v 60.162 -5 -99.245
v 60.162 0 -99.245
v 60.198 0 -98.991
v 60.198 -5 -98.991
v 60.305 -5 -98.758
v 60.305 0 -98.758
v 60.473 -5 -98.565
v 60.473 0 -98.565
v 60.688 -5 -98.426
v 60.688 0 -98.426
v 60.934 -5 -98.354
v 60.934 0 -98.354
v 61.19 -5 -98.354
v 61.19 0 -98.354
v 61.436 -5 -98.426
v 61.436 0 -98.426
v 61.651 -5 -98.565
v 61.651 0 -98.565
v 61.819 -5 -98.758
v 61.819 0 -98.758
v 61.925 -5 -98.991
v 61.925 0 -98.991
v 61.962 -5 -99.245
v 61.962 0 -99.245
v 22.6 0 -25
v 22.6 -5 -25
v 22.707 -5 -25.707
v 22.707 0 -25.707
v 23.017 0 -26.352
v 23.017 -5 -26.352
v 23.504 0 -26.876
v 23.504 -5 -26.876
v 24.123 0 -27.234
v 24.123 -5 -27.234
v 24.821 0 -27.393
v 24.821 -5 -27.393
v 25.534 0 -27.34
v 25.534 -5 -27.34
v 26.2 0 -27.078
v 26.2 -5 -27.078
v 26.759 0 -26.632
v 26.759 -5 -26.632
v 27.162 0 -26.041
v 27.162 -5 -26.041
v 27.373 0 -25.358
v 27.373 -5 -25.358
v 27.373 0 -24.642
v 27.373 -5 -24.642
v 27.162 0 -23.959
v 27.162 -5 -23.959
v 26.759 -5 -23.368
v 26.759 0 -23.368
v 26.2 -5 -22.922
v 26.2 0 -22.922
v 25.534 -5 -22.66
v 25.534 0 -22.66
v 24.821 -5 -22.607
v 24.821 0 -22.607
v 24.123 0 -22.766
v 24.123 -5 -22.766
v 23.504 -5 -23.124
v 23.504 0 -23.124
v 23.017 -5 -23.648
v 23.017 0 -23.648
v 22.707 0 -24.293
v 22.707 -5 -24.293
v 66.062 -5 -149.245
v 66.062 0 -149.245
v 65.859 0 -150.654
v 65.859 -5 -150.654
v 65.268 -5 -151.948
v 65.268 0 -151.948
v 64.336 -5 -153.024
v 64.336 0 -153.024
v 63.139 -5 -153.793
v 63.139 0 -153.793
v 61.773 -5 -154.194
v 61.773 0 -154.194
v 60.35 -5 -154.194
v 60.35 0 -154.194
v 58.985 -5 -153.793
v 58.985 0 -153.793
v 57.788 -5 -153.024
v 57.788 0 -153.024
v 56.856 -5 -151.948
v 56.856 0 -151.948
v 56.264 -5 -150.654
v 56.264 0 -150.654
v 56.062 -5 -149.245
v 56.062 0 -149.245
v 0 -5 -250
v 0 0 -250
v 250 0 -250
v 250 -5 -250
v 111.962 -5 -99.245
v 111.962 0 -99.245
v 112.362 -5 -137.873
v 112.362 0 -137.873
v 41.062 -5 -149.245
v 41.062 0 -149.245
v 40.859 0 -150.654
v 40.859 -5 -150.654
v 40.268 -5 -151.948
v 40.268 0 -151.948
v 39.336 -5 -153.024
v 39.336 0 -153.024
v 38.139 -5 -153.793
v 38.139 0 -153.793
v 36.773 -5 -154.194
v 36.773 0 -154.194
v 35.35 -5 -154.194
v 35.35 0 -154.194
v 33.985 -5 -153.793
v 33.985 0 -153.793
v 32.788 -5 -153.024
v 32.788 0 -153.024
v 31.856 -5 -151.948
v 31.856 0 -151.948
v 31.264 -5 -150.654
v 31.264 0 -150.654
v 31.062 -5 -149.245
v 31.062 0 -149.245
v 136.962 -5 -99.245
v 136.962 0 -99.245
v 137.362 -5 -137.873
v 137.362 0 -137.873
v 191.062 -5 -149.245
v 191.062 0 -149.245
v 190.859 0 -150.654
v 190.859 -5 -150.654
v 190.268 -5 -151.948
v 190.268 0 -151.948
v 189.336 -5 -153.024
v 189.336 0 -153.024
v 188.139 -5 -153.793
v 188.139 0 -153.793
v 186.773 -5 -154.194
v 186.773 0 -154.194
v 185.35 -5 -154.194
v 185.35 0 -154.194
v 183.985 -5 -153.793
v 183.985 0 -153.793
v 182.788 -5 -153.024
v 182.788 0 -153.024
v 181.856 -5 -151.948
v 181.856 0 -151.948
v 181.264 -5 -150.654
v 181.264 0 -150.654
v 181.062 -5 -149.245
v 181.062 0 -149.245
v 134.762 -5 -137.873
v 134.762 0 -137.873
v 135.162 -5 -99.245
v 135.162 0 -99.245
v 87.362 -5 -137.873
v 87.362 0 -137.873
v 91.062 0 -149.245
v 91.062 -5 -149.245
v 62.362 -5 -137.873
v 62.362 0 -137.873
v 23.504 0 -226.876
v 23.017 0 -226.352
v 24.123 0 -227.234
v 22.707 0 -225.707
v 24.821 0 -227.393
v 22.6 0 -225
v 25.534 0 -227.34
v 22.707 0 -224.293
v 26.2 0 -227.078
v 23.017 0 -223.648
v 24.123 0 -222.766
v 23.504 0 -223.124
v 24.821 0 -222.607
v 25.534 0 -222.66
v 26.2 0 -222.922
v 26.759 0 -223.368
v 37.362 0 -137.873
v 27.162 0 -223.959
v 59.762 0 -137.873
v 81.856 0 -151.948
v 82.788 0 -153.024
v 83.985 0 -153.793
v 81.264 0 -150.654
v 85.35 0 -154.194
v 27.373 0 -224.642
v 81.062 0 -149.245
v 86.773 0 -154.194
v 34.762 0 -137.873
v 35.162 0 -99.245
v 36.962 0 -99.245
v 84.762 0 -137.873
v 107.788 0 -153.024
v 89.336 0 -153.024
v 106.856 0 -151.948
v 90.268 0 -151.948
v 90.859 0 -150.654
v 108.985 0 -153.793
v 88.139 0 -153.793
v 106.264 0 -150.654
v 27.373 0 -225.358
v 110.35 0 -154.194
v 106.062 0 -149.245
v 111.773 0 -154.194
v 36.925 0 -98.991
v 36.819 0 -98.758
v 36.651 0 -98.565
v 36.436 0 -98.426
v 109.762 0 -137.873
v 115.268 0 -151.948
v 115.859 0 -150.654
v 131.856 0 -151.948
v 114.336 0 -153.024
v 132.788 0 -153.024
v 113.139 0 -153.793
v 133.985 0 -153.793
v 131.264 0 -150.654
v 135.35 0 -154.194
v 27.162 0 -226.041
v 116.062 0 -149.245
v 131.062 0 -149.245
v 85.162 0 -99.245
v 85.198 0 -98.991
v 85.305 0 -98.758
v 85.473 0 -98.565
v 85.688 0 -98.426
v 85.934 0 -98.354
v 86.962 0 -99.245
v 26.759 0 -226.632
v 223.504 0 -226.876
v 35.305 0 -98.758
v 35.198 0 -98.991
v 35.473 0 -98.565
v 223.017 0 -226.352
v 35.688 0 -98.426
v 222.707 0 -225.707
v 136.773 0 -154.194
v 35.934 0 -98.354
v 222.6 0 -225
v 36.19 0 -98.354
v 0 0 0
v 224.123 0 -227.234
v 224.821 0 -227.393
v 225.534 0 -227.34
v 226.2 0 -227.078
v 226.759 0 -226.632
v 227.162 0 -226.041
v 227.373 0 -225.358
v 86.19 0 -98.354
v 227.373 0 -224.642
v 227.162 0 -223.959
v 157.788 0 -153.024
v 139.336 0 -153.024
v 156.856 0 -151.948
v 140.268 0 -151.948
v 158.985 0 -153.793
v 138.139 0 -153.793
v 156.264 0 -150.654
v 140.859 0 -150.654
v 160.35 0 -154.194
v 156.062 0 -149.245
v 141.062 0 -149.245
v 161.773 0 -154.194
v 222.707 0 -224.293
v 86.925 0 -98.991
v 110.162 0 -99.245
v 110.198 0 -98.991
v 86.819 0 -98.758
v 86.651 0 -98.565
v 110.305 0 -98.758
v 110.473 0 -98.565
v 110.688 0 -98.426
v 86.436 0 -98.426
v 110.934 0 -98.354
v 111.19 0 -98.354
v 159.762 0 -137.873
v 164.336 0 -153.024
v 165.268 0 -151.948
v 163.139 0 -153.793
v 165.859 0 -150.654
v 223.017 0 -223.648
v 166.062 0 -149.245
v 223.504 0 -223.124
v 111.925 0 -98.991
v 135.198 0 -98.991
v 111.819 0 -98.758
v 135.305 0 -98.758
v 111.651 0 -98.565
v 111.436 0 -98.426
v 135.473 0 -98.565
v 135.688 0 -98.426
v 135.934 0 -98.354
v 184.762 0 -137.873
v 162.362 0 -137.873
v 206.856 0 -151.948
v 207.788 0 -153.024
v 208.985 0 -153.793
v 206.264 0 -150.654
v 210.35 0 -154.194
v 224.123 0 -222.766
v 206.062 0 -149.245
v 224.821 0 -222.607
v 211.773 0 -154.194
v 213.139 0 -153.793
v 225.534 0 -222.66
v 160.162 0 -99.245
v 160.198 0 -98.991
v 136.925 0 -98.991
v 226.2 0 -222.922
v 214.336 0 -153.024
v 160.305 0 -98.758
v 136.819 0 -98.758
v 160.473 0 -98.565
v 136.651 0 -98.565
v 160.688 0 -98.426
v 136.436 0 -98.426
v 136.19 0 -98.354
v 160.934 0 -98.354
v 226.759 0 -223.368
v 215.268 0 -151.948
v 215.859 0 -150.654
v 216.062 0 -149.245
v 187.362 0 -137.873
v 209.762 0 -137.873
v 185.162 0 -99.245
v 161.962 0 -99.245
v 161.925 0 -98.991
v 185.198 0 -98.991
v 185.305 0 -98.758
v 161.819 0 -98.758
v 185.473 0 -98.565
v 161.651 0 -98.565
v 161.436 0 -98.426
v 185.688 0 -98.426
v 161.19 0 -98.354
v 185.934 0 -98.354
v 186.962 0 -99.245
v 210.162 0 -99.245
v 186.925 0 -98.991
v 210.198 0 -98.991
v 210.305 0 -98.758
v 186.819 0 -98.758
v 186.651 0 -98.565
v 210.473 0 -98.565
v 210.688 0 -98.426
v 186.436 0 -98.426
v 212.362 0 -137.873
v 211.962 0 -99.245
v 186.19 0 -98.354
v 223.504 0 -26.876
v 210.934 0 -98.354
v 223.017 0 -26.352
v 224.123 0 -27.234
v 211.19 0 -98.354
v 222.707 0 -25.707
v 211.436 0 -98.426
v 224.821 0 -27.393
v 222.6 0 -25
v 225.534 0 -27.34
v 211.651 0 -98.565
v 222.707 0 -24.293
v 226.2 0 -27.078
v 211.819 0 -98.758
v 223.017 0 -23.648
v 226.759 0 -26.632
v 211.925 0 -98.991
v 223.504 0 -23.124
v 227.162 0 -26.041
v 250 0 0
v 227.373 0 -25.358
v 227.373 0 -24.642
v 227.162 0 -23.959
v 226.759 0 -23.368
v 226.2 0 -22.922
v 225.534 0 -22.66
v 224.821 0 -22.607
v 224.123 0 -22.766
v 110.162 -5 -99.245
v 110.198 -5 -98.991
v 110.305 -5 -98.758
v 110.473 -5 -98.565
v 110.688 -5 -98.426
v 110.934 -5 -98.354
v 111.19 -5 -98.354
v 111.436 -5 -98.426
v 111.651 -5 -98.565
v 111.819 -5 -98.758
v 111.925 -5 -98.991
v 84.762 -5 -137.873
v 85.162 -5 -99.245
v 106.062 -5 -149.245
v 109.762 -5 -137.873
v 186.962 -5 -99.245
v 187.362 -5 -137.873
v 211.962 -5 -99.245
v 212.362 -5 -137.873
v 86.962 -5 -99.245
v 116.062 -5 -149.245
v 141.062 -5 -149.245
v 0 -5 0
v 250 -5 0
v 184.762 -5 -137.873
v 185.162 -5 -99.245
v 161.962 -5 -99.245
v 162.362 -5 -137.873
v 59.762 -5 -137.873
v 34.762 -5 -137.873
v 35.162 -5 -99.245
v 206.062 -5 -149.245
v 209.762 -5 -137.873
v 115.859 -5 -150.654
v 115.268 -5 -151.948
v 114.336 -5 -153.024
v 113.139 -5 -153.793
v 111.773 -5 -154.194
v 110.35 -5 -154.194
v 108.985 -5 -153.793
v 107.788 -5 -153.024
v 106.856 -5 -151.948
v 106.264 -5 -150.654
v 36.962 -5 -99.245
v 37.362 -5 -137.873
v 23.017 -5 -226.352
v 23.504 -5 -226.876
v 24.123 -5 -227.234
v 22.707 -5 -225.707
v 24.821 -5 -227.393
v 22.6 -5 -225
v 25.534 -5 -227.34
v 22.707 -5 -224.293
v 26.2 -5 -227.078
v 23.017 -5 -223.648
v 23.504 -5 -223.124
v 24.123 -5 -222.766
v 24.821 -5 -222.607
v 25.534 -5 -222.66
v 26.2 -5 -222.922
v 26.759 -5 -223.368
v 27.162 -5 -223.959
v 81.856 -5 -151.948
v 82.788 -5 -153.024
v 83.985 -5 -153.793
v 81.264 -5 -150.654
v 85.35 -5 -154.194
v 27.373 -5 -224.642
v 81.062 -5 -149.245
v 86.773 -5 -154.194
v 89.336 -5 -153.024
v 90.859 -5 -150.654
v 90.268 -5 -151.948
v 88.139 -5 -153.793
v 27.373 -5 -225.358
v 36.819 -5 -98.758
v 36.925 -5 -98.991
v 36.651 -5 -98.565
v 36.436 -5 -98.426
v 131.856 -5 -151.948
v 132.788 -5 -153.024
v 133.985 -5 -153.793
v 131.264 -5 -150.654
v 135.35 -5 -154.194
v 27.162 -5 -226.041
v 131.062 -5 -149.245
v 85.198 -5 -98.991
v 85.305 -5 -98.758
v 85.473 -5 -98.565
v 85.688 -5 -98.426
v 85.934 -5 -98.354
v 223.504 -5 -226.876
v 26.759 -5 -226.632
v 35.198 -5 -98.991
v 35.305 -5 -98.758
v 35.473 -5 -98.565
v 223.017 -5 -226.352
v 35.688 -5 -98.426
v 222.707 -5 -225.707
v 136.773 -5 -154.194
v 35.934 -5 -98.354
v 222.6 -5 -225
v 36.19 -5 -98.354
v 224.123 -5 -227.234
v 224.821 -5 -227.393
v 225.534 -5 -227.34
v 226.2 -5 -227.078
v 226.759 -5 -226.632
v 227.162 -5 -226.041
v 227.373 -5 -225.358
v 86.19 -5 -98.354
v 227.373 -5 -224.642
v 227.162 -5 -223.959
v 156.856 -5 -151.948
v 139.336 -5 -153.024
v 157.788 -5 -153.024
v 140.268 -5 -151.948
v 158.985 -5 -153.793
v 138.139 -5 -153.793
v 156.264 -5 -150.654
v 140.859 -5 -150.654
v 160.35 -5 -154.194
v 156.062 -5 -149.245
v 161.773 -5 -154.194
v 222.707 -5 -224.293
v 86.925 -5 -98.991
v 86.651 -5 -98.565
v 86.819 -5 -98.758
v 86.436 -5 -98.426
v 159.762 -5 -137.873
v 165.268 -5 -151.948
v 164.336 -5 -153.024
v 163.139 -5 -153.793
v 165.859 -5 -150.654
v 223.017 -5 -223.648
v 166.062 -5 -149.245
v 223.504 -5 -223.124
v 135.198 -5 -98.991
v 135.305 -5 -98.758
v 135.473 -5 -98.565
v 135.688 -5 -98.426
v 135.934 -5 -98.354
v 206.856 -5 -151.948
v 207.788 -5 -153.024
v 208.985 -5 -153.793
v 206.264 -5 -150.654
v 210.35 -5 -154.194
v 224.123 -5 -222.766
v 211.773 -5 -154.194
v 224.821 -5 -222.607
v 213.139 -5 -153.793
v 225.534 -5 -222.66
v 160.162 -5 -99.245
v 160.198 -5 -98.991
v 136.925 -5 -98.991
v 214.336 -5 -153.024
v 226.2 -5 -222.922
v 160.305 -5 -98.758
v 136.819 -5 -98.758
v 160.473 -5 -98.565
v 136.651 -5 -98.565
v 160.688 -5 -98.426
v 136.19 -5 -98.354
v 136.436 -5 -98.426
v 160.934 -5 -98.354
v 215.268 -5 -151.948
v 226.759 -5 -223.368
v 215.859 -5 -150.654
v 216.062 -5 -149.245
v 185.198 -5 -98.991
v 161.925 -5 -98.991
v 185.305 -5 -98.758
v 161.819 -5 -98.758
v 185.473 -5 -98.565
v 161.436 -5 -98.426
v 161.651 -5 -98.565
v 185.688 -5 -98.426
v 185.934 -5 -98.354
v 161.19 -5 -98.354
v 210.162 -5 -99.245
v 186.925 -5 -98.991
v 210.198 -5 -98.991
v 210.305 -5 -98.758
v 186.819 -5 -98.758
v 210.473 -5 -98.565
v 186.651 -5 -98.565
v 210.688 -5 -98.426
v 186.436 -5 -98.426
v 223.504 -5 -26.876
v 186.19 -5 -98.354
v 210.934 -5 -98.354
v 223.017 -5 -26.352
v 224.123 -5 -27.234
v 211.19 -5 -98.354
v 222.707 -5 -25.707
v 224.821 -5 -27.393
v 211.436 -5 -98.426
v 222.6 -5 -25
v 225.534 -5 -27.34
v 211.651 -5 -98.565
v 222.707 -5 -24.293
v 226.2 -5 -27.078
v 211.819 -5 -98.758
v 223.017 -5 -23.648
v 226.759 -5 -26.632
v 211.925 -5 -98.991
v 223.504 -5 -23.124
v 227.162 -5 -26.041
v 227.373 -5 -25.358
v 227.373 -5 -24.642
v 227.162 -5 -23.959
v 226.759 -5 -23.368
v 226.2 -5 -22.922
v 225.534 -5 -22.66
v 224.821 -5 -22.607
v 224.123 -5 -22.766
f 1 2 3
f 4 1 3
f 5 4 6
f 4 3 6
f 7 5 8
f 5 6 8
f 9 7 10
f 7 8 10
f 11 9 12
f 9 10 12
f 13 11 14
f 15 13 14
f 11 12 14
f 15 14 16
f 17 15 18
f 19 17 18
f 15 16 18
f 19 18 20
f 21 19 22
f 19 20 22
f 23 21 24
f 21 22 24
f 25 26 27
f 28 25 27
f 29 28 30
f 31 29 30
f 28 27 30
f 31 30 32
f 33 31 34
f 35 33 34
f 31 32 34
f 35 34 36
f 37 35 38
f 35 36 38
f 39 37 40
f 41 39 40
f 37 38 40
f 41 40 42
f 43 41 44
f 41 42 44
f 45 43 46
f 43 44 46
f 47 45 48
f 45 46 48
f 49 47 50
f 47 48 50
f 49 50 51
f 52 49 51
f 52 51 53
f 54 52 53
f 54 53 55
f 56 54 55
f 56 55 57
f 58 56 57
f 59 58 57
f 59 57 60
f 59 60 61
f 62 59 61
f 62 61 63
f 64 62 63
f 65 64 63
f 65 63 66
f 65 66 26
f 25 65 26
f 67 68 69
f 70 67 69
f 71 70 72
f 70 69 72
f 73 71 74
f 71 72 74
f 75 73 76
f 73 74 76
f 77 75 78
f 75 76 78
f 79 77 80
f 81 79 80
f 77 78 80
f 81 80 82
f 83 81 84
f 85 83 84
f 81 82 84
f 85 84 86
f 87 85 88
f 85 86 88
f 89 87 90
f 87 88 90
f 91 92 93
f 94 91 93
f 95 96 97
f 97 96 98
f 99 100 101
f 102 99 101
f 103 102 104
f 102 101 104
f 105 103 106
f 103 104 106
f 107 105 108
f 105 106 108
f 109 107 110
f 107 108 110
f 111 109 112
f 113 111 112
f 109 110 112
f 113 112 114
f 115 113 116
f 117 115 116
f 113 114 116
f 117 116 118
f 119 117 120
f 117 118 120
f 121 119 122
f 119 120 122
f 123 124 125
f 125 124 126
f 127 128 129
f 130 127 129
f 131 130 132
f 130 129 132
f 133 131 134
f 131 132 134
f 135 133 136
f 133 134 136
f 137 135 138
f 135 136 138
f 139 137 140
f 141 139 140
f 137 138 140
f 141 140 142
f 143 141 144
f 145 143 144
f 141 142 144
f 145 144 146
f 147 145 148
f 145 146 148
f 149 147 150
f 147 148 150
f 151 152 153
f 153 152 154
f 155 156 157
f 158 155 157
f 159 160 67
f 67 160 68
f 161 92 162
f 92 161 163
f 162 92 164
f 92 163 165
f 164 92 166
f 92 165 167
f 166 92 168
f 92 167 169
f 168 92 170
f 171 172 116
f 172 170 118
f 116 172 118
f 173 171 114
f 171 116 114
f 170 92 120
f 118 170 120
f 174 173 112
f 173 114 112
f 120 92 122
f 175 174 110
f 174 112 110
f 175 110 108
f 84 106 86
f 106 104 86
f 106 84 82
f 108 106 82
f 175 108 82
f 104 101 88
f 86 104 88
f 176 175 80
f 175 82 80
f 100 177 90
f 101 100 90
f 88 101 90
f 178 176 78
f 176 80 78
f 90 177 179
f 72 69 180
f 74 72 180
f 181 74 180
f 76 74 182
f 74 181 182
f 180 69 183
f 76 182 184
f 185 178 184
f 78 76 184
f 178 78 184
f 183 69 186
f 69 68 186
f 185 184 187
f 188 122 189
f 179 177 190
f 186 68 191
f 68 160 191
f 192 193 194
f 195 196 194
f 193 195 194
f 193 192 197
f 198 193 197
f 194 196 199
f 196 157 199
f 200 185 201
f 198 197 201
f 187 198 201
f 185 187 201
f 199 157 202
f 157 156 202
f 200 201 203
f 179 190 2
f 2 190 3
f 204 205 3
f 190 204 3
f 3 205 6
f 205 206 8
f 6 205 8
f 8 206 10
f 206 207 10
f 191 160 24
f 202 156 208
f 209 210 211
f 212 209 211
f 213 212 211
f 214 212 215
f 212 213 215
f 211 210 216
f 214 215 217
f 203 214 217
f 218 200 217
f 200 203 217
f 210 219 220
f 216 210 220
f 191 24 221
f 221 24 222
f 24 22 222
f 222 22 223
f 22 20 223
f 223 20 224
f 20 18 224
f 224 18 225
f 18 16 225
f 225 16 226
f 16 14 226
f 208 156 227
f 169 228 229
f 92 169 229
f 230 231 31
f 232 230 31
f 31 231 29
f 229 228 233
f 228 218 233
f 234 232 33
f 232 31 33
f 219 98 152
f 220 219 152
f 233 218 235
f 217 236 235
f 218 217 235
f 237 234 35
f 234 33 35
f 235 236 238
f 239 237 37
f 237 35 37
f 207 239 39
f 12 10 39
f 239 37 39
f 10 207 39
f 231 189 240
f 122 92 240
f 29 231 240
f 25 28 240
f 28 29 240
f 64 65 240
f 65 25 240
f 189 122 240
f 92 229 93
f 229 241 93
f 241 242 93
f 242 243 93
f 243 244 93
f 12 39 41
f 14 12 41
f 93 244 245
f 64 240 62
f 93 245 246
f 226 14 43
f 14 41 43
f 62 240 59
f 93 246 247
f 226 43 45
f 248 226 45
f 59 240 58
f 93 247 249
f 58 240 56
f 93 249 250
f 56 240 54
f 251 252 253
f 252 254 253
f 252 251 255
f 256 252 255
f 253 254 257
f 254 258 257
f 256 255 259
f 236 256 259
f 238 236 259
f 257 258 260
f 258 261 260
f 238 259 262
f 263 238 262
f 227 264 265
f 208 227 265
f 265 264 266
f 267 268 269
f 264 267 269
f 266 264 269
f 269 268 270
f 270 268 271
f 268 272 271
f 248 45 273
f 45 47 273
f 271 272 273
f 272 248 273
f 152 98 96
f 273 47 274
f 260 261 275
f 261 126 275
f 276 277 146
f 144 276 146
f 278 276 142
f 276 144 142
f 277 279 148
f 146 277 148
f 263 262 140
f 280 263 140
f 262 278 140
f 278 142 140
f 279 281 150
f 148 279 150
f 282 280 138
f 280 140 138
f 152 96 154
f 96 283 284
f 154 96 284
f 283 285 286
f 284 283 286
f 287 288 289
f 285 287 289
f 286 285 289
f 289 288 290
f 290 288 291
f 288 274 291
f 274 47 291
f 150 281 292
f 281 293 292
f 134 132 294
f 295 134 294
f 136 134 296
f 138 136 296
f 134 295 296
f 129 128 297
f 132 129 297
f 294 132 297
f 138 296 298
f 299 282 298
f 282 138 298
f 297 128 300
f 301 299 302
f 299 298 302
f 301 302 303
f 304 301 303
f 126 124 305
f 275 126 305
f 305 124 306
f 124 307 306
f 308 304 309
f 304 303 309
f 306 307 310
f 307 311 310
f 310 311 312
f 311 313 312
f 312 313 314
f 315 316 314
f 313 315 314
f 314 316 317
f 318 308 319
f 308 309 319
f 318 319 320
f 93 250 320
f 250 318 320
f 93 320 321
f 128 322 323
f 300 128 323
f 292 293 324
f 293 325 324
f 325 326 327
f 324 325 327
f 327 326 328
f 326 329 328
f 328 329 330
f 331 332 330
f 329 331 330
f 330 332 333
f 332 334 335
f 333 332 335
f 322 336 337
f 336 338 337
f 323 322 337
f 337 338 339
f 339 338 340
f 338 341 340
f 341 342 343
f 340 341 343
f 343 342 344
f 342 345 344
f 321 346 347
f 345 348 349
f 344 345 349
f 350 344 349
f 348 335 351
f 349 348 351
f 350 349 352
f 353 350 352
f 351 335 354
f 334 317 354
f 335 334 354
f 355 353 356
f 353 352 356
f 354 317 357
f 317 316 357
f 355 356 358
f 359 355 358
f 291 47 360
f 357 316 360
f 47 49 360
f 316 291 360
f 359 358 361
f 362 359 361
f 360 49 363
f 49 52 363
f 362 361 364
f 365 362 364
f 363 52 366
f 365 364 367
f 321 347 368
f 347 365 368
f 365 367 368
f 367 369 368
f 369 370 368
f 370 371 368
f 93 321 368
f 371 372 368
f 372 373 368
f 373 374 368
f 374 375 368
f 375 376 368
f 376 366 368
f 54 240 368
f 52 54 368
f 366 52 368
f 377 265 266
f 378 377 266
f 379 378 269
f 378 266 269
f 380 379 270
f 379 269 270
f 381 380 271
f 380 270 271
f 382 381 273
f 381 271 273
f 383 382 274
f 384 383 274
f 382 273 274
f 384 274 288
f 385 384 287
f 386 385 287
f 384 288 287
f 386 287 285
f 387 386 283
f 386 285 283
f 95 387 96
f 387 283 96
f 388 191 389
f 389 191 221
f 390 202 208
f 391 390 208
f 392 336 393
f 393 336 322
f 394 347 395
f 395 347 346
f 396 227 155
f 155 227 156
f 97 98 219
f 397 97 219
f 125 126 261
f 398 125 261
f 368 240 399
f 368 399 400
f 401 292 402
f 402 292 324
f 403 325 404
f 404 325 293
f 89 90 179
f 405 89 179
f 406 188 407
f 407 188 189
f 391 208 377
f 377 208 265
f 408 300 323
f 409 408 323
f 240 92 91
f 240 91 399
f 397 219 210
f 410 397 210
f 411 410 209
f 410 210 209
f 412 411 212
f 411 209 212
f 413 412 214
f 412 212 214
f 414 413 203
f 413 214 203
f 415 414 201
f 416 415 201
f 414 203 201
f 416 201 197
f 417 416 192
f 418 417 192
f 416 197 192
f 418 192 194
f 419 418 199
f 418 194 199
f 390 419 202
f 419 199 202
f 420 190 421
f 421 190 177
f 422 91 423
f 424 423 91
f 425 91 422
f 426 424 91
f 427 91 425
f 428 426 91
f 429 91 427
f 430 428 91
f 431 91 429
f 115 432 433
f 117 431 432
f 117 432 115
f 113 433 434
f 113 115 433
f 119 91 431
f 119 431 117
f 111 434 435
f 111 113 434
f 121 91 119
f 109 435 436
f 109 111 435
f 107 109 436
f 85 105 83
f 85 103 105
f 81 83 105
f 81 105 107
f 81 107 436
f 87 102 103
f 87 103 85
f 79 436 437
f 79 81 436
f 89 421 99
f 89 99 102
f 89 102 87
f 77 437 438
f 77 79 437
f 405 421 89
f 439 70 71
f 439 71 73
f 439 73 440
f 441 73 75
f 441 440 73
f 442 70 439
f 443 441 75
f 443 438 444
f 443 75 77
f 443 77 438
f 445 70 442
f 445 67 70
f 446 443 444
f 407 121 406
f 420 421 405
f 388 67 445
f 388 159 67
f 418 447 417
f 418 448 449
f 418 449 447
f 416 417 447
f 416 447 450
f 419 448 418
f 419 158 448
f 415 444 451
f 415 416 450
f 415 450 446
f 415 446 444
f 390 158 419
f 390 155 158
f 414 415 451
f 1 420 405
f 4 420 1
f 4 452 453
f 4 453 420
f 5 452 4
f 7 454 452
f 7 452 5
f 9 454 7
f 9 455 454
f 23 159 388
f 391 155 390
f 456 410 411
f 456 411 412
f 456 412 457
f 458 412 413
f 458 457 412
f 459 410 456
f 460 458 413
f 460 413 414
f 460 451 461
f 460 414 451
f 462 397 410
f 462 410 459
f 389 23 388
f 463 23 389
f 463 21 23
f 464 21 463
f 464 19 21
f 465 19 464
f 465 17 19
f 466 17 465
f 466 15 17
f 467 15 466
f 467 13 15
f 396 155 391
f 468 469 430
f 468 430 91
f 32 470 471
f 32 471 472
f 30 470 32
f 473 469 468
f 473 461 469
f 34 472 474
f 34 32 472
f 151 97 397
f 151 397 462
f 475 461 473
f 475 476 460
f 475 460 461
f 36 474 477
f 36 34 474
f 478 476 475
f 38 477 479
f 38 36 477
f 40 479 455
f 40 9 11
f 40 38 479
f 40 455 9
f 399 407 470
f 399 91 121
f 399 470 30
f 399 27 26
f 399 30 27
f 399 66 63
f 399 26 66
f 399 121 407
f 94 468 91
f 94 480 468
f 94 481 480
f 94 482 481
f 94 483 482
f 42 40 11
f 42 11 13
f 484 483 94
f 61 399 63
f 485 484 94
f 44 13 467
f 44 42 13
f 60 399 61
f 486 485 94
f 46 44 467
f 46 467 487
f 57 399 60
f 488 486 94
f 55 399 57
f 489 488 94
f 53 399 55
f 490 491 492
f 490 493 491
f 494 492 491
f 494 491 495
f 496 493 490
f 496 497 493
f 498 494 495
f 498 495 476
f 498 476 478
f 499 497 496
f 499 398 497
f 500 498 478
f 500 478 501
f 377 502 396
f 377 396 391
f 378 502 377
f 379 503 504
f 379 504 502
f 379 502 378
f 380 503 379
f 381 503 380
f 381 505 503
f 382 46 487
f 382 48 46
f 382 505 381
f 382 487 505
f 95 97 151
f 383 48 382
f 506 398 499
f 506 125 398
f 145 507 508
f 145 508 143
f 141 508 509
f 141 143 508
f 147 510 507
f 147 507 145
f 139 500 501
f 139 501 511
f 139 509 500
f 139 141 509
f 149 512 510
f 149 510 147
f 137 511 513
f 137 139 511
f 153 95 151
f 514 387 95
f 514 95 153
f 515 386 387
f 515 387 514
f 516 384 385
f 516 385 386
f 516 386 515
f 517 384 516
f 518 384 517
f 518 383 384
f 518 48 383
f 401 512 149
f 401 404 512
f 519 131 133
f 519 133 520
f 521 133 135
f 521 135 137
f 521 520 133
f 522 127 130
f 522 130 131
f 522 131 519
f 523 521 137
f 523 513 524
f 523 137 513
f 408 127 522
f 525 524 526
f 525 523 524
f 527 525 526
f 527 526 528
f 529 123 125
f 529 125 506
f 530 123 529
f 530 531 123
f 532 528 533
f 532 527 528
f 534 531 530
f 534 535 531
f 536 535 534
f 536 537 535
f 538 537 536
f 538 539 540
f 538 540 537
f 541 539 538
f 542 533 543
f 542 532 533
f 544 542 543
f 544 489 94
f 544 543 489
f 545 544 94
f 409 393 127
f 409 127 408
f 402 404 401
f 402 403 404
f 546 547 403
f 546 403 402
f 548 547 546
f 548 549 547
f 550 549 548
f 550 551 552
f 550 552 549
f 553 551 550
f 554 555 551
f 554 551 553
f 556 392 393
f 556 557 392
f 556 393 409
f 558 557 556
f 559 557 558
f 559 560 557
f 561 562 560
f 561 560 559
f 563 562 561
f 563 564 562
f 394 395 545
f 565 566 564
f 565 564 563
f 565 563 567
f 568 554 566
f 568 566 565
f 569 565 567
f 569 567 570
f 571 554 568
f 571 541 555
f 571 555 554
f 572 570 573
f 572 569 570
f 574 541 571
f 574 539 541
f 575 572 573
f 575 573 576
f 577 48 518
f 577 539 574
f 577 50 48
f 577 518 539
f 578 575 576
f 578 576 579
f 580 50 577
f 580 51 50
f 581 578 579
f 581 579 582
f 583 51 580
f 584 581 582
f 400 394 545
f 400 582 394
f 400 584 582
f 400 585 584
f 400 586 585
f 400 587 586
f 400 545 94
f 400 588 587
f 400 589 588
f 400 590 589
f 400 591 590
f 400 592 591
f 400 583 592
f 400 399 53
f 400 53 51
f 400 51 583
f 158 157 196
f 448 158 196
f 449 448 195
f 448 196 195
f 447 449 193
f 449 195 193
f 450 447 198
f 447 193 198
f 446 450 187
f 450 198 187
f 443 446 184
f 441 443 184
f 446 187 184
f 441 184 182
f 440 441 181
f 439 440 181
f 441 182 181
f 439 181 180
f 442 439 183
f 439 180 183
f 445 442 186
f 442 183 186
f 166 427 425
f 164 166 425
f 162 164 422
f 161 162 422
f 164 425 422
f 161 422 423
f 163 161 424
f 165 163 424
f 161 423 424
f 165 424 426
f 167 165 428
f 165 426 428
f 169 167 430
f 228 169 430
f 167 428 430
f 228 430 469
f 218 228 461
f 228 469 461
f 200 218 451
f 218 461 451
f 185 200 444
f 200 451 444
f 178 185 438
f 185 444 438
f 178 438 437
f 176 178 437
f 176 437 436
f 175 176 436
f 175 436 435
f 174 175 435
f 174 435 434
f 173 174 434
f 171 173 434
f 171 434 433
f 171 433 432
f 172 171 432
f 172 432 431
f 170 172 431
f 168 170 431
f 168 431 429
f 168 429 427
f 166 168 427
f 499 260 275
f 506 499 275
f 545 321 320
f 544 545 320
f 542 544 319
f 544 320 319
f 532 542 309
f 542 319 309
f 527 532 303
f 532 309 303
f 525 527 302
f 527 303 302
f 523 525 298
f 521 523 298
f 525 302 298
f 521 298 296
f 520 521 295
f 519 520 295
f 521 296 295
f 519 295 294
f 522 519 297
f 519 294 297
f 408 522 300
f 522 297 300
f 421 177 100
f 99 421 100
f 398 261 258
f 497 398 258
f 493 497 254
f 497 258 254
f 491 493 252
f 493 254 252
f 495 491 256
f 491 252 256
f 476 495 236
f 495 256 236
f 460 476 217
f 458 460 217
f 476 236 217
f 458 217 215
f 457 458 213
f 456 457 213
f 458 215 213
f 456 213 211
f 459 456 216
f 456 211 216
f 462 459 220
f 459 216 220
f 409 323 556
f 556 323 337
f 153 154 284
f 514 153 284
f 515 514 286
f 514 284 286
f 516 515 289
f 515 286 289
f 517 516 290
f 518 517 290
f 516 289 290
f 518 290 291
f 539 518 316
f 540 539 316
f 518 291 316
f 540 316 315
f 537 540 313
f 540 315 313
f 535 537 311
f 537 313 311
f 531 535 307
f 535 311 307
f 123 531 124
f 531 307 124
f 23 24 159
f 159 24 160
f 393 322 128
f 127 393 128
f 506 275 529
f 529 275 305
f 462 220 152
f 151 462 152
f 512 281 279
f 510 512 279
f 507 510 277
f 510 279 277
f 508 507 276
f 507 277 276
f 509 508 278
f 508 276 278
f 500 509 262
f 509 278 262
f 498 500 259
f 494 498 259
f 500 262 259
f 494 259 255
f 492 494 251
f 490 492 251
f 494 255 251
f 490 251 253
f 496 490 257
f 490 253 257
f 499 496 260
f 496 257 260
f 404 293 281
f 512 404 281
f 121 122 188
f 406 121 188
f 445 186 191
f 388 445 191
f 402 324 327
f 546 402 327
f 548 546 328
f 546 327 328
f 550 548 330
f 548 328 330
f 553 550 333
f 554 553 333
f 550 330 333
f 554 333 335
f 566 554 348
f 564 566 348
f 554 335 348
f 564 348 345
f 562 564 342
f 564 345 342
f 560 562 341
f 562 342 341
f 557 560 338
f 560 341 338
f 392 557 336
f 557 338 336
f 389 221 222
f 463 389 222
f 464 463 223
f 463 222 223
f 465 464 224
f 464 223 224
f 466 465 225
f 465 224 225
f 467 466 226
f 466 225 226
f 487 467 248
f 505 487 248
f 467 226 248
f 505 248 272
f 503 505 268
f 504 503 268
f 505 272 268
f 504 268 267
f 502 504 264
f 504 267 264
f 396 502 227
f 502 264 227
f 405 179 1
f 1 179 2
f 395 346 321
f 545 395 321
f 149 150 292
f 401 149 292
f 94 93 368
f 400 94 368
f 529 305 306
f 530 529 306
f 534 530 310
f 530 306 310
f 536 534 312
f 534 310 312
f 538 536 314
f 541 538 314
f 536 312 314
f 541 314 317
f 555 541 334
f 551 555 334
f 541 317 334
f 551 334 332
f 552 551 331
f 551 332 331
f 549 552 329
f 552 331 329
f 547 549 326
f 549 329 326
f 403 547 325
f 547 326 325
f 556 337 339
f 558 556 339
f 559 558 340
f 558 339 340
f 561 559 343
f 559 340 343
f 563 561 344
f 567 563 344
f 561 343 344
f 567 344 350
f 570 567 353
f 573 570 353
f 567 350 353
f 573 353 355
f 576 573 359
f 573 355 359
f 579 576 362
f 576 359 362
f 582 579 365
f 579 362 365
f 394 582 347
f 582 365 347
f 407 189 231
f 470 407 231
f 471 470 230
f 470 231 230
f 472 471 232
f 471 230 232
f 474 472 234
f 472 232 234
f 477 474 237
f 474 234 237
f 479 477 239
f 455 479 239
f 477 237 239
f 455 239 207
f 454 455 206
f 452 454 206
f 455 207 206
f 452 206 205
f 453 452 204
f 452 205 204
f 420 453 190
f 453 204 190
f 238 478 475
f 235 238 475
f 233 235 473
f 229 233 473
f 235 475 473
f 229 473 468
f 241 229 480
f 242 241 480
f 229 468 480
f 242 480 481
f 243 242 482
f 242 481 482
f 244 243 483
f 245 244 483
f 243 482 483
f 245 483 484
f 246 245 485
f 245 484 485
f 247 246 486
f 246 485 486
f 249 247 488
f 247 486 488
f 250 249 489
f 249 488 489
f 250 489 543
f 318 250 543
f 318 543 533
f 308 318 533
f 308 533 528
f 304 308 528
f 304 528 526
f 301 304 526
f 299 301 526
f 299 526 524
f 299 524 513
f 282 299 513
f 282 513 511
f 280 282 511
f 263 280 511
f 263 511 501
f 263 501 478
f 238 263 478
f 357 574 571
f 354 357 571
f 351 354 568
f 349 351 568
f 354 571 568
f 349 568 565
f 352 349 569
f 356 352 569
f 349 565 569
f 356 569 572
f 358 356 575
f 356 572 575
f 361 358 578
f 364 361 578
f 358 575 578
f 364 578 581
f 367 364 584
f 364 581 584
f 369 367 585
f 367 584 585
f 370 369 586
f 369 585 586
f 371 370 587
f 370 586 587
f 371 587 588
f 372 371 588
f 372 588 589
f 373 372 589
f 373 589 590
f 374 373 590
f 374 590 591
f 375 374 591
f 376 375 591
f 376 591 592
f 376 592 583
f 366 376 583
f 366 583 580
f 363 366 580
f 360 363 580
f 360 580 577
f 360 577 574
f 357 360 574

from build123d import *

# Parameters (mm, degrees)
F0_W     = 250
F0_H     = 250
F1_DEPTH = 5
F2_D     = 4.8


with BuildPart() as f1:
    # F0 (on Front) → F1 (new body)
    with BuildSketch(Plane.XZ):
        with Locations((125, -125)):
            Rectangle(F0_W, F0_H)
        with BuildLine():
            ThreePointArc((41.0619131156, -149.2449066583), (36.0619131156, -154.2449066583), (31.0619131156, -149.2449066583))
            Line((31.0619131156, -149.2449066583), (34.7619131156, -137.8727704287))
            Line((34.7619131156, -137.8727704287), (35.1619131156, -99.2449066583))
            ThreePointArc((35.1619131156, -99.2449066583), (36.0619131156, -98.3449066583), (36.9619131156, -99.2449066583))
            Line((36.9619131156, -99.2449066583), (37.3619131156, -137.8727704287))
            Line((37.3619131156, -137.8727704287), (41.0619131156, -149.2449066583))
        make_face(mode=Mode.SUBTRACT)
        with BuildLine():
            Line((62.3619131156, -137.8727704287), (66.0619131156, -149.2449066583))
            ThreePointArc((66.0619131156, -149.2449066583), (61.0619131156, -154.2449066583), (56.0619131156, -149.2449066583))
            Line((56.0619131156, -149.2449066583), (59.7619131156, -137.8727704287))
            Line((59.7619131156, -137.8727704287), (60.1619131156, -99.2449066583))
            ThreePointArc((60.1619131156, -99.2449066583), (61.0619131156, -98.3449066583), (61.9619131156, -99.2449066583))
            Line((61.9619131156, -99.2449066583), (62.3619131156, -137.8727704287))
        make_face(mode=Mode.SUBTRACT)
        with BuildLine():
            Line((87.3619131156, -137.8727704287), (91.0619131156, -149.2449066583))
            ThreePointArc((91.0619131156, -149.2449066583), (86.0619131156, -154.2449066583), (81.0619131156, -149.2449066583))
            Line((81.0619131156, -149.2449066583), (84.7619131156, -137.8727704287))
            Line((84.7619131156, -137.8727704287), (85.1619131156, -99.2449066583))
            ThreePointArc((85.1619131156, -99.2449066583), (86.0619131156, -98.3449066583), (86.9619131156, -99.2449066583))
            Line((86.9619131156, -99.2449066583), (87.3619131156, -137.8727704287))
        make_face(mode=Mode.SUBTRACT)
        with BuildLine():
            Line((112.3619131156, -137.8727704287), (116.0619131156, -149.2449066583))
            ThreePointArc((116.0619131156, -149.2449066583), (111.0619131156, -154.2449066583), (106.0619131156, -149.2449066583))
            Line((106.0619131156, -149.2449066583), (109.7619131156, -137.8727704287))
            Line((109.7619131156, -137.8727704287), (110.1619131156, -99.2449066583))
            ThreePointArc((110.1619131156, -99.2449066583), (111.0619131156, -98.3449066583), (111.9619131156, -99.2449066583))
            Line((111.9619131156, -99.2449066583), (112.3619131156, -137.8727704287))
        make_face(mode=Mode.SUBTRACT)
        with BuildLine():
            Line((137.3619131156, -137.8727704287), (141.0619131156, -149.2449066583))
            ThreePointArc((141.0619131156, -149.2449066583), (136.0619131156, -154.2449066583), (131.0619131156, -149.2449066583))
            Line((131.0619131156, -149.2449066583), (134.7619131156, -137.8727704287))
            Line((134.7619131156, -137.8727704287), (135.1619131156, -99.2449066583))
            ThreePointArc((135.1619131156, -99.2449066583), (136.0619131156, -98.3449066583), (136.9619131156, -99.2449066583))
            Line((136.9619131156, -99.2449066583), (137.3619131156, -137.8727704287))
        make_face(mode=Mode.SUBTRACT)
        with BuildLine():
            Line((162.3619131156, -137.8727704287), (166.0619131156, -149.2449066583))
            ThreePointArc((166.0619131156, -149.2449066583), (161.0619131156, -154.2449066583), (156.0619131156, -149.2449066583))
            Line((156.0619131156, -149.2449066583), (159.7619131156, -137.8727704287))
            Line((159.7619131156, -137.8727704287), (160.1619131156, -99.2449066583))
            ThreePointArc((160.1619131156, -99.2449066583), (161.0619131156, -98.3449066583), (161.9619131156, -99.2449066583))
            Line((161.9619131156, -99.2449066583), (162.3619131156, -137.8727704287))
        make_face(mode=Mode.SUBTRACT)
        with BuildLine():
            Line((187.3619131156, -137.8727704287), (191.0619131156, -149.2449066583))
            ThreePointArc((191.0619131156, -149.2449066583), (186.0619131156, -154.2449066583), (181.0619131156, -149.2449066583))
            Line((181.0619131156, -149.2449066583), (184.7619131156, -137.8727704287))
            Line((184.7619131156, -137.8727704287), (185.1619131156, -99.2449066583))
            ThreePointArc((185.1619131156, -99.2449066583), (186.0619131156, -98.3449066583), (186.9619131156, -99.2449066583))
            Line((186.9619131156, -99.2449066583), (187.3619131156, -137.8727704287))
        make_face(mode=Mode.SUBTRACT)
        with BuildLine():
            Line((212.3619131156, -137.8727704287), (216.0619131156, -149.2449066583))
            ThreePointArc((216.0619131156, -149.2449066583), (211.0619131156, -154.2449066583), (206.0619131156, -149.2449066583))
            Line((206.0619131156, -149.2449066583), (209.7619131156, -137.8727704287))
            Line((209.7619131156, -137.8727704287), (210.1619131156, -99.2449066583))
            ThreePointArc((210.1619131156, -99.2449066583), (211.0619131156, -98.3449066583), (211.9619131156, -99.2449066583))
            Line((211.9619131156, -99.2449066583), (212.3619131156, -137.8727704287))
        make_face(mode=Mode.SUBTRACT)
    extrude(amount=F1_DEPTH)

    # F2 (through all)
    with Locations(Plane(origin=(0, 0, 0), x_dir=(1, 0, 0), z_dir=(0, 1, 0))):
        with Locations((25, 25), (225, 25), (225, 225), (25, 225)):
            Hole(F2_D / 2)


solid = f1.part
